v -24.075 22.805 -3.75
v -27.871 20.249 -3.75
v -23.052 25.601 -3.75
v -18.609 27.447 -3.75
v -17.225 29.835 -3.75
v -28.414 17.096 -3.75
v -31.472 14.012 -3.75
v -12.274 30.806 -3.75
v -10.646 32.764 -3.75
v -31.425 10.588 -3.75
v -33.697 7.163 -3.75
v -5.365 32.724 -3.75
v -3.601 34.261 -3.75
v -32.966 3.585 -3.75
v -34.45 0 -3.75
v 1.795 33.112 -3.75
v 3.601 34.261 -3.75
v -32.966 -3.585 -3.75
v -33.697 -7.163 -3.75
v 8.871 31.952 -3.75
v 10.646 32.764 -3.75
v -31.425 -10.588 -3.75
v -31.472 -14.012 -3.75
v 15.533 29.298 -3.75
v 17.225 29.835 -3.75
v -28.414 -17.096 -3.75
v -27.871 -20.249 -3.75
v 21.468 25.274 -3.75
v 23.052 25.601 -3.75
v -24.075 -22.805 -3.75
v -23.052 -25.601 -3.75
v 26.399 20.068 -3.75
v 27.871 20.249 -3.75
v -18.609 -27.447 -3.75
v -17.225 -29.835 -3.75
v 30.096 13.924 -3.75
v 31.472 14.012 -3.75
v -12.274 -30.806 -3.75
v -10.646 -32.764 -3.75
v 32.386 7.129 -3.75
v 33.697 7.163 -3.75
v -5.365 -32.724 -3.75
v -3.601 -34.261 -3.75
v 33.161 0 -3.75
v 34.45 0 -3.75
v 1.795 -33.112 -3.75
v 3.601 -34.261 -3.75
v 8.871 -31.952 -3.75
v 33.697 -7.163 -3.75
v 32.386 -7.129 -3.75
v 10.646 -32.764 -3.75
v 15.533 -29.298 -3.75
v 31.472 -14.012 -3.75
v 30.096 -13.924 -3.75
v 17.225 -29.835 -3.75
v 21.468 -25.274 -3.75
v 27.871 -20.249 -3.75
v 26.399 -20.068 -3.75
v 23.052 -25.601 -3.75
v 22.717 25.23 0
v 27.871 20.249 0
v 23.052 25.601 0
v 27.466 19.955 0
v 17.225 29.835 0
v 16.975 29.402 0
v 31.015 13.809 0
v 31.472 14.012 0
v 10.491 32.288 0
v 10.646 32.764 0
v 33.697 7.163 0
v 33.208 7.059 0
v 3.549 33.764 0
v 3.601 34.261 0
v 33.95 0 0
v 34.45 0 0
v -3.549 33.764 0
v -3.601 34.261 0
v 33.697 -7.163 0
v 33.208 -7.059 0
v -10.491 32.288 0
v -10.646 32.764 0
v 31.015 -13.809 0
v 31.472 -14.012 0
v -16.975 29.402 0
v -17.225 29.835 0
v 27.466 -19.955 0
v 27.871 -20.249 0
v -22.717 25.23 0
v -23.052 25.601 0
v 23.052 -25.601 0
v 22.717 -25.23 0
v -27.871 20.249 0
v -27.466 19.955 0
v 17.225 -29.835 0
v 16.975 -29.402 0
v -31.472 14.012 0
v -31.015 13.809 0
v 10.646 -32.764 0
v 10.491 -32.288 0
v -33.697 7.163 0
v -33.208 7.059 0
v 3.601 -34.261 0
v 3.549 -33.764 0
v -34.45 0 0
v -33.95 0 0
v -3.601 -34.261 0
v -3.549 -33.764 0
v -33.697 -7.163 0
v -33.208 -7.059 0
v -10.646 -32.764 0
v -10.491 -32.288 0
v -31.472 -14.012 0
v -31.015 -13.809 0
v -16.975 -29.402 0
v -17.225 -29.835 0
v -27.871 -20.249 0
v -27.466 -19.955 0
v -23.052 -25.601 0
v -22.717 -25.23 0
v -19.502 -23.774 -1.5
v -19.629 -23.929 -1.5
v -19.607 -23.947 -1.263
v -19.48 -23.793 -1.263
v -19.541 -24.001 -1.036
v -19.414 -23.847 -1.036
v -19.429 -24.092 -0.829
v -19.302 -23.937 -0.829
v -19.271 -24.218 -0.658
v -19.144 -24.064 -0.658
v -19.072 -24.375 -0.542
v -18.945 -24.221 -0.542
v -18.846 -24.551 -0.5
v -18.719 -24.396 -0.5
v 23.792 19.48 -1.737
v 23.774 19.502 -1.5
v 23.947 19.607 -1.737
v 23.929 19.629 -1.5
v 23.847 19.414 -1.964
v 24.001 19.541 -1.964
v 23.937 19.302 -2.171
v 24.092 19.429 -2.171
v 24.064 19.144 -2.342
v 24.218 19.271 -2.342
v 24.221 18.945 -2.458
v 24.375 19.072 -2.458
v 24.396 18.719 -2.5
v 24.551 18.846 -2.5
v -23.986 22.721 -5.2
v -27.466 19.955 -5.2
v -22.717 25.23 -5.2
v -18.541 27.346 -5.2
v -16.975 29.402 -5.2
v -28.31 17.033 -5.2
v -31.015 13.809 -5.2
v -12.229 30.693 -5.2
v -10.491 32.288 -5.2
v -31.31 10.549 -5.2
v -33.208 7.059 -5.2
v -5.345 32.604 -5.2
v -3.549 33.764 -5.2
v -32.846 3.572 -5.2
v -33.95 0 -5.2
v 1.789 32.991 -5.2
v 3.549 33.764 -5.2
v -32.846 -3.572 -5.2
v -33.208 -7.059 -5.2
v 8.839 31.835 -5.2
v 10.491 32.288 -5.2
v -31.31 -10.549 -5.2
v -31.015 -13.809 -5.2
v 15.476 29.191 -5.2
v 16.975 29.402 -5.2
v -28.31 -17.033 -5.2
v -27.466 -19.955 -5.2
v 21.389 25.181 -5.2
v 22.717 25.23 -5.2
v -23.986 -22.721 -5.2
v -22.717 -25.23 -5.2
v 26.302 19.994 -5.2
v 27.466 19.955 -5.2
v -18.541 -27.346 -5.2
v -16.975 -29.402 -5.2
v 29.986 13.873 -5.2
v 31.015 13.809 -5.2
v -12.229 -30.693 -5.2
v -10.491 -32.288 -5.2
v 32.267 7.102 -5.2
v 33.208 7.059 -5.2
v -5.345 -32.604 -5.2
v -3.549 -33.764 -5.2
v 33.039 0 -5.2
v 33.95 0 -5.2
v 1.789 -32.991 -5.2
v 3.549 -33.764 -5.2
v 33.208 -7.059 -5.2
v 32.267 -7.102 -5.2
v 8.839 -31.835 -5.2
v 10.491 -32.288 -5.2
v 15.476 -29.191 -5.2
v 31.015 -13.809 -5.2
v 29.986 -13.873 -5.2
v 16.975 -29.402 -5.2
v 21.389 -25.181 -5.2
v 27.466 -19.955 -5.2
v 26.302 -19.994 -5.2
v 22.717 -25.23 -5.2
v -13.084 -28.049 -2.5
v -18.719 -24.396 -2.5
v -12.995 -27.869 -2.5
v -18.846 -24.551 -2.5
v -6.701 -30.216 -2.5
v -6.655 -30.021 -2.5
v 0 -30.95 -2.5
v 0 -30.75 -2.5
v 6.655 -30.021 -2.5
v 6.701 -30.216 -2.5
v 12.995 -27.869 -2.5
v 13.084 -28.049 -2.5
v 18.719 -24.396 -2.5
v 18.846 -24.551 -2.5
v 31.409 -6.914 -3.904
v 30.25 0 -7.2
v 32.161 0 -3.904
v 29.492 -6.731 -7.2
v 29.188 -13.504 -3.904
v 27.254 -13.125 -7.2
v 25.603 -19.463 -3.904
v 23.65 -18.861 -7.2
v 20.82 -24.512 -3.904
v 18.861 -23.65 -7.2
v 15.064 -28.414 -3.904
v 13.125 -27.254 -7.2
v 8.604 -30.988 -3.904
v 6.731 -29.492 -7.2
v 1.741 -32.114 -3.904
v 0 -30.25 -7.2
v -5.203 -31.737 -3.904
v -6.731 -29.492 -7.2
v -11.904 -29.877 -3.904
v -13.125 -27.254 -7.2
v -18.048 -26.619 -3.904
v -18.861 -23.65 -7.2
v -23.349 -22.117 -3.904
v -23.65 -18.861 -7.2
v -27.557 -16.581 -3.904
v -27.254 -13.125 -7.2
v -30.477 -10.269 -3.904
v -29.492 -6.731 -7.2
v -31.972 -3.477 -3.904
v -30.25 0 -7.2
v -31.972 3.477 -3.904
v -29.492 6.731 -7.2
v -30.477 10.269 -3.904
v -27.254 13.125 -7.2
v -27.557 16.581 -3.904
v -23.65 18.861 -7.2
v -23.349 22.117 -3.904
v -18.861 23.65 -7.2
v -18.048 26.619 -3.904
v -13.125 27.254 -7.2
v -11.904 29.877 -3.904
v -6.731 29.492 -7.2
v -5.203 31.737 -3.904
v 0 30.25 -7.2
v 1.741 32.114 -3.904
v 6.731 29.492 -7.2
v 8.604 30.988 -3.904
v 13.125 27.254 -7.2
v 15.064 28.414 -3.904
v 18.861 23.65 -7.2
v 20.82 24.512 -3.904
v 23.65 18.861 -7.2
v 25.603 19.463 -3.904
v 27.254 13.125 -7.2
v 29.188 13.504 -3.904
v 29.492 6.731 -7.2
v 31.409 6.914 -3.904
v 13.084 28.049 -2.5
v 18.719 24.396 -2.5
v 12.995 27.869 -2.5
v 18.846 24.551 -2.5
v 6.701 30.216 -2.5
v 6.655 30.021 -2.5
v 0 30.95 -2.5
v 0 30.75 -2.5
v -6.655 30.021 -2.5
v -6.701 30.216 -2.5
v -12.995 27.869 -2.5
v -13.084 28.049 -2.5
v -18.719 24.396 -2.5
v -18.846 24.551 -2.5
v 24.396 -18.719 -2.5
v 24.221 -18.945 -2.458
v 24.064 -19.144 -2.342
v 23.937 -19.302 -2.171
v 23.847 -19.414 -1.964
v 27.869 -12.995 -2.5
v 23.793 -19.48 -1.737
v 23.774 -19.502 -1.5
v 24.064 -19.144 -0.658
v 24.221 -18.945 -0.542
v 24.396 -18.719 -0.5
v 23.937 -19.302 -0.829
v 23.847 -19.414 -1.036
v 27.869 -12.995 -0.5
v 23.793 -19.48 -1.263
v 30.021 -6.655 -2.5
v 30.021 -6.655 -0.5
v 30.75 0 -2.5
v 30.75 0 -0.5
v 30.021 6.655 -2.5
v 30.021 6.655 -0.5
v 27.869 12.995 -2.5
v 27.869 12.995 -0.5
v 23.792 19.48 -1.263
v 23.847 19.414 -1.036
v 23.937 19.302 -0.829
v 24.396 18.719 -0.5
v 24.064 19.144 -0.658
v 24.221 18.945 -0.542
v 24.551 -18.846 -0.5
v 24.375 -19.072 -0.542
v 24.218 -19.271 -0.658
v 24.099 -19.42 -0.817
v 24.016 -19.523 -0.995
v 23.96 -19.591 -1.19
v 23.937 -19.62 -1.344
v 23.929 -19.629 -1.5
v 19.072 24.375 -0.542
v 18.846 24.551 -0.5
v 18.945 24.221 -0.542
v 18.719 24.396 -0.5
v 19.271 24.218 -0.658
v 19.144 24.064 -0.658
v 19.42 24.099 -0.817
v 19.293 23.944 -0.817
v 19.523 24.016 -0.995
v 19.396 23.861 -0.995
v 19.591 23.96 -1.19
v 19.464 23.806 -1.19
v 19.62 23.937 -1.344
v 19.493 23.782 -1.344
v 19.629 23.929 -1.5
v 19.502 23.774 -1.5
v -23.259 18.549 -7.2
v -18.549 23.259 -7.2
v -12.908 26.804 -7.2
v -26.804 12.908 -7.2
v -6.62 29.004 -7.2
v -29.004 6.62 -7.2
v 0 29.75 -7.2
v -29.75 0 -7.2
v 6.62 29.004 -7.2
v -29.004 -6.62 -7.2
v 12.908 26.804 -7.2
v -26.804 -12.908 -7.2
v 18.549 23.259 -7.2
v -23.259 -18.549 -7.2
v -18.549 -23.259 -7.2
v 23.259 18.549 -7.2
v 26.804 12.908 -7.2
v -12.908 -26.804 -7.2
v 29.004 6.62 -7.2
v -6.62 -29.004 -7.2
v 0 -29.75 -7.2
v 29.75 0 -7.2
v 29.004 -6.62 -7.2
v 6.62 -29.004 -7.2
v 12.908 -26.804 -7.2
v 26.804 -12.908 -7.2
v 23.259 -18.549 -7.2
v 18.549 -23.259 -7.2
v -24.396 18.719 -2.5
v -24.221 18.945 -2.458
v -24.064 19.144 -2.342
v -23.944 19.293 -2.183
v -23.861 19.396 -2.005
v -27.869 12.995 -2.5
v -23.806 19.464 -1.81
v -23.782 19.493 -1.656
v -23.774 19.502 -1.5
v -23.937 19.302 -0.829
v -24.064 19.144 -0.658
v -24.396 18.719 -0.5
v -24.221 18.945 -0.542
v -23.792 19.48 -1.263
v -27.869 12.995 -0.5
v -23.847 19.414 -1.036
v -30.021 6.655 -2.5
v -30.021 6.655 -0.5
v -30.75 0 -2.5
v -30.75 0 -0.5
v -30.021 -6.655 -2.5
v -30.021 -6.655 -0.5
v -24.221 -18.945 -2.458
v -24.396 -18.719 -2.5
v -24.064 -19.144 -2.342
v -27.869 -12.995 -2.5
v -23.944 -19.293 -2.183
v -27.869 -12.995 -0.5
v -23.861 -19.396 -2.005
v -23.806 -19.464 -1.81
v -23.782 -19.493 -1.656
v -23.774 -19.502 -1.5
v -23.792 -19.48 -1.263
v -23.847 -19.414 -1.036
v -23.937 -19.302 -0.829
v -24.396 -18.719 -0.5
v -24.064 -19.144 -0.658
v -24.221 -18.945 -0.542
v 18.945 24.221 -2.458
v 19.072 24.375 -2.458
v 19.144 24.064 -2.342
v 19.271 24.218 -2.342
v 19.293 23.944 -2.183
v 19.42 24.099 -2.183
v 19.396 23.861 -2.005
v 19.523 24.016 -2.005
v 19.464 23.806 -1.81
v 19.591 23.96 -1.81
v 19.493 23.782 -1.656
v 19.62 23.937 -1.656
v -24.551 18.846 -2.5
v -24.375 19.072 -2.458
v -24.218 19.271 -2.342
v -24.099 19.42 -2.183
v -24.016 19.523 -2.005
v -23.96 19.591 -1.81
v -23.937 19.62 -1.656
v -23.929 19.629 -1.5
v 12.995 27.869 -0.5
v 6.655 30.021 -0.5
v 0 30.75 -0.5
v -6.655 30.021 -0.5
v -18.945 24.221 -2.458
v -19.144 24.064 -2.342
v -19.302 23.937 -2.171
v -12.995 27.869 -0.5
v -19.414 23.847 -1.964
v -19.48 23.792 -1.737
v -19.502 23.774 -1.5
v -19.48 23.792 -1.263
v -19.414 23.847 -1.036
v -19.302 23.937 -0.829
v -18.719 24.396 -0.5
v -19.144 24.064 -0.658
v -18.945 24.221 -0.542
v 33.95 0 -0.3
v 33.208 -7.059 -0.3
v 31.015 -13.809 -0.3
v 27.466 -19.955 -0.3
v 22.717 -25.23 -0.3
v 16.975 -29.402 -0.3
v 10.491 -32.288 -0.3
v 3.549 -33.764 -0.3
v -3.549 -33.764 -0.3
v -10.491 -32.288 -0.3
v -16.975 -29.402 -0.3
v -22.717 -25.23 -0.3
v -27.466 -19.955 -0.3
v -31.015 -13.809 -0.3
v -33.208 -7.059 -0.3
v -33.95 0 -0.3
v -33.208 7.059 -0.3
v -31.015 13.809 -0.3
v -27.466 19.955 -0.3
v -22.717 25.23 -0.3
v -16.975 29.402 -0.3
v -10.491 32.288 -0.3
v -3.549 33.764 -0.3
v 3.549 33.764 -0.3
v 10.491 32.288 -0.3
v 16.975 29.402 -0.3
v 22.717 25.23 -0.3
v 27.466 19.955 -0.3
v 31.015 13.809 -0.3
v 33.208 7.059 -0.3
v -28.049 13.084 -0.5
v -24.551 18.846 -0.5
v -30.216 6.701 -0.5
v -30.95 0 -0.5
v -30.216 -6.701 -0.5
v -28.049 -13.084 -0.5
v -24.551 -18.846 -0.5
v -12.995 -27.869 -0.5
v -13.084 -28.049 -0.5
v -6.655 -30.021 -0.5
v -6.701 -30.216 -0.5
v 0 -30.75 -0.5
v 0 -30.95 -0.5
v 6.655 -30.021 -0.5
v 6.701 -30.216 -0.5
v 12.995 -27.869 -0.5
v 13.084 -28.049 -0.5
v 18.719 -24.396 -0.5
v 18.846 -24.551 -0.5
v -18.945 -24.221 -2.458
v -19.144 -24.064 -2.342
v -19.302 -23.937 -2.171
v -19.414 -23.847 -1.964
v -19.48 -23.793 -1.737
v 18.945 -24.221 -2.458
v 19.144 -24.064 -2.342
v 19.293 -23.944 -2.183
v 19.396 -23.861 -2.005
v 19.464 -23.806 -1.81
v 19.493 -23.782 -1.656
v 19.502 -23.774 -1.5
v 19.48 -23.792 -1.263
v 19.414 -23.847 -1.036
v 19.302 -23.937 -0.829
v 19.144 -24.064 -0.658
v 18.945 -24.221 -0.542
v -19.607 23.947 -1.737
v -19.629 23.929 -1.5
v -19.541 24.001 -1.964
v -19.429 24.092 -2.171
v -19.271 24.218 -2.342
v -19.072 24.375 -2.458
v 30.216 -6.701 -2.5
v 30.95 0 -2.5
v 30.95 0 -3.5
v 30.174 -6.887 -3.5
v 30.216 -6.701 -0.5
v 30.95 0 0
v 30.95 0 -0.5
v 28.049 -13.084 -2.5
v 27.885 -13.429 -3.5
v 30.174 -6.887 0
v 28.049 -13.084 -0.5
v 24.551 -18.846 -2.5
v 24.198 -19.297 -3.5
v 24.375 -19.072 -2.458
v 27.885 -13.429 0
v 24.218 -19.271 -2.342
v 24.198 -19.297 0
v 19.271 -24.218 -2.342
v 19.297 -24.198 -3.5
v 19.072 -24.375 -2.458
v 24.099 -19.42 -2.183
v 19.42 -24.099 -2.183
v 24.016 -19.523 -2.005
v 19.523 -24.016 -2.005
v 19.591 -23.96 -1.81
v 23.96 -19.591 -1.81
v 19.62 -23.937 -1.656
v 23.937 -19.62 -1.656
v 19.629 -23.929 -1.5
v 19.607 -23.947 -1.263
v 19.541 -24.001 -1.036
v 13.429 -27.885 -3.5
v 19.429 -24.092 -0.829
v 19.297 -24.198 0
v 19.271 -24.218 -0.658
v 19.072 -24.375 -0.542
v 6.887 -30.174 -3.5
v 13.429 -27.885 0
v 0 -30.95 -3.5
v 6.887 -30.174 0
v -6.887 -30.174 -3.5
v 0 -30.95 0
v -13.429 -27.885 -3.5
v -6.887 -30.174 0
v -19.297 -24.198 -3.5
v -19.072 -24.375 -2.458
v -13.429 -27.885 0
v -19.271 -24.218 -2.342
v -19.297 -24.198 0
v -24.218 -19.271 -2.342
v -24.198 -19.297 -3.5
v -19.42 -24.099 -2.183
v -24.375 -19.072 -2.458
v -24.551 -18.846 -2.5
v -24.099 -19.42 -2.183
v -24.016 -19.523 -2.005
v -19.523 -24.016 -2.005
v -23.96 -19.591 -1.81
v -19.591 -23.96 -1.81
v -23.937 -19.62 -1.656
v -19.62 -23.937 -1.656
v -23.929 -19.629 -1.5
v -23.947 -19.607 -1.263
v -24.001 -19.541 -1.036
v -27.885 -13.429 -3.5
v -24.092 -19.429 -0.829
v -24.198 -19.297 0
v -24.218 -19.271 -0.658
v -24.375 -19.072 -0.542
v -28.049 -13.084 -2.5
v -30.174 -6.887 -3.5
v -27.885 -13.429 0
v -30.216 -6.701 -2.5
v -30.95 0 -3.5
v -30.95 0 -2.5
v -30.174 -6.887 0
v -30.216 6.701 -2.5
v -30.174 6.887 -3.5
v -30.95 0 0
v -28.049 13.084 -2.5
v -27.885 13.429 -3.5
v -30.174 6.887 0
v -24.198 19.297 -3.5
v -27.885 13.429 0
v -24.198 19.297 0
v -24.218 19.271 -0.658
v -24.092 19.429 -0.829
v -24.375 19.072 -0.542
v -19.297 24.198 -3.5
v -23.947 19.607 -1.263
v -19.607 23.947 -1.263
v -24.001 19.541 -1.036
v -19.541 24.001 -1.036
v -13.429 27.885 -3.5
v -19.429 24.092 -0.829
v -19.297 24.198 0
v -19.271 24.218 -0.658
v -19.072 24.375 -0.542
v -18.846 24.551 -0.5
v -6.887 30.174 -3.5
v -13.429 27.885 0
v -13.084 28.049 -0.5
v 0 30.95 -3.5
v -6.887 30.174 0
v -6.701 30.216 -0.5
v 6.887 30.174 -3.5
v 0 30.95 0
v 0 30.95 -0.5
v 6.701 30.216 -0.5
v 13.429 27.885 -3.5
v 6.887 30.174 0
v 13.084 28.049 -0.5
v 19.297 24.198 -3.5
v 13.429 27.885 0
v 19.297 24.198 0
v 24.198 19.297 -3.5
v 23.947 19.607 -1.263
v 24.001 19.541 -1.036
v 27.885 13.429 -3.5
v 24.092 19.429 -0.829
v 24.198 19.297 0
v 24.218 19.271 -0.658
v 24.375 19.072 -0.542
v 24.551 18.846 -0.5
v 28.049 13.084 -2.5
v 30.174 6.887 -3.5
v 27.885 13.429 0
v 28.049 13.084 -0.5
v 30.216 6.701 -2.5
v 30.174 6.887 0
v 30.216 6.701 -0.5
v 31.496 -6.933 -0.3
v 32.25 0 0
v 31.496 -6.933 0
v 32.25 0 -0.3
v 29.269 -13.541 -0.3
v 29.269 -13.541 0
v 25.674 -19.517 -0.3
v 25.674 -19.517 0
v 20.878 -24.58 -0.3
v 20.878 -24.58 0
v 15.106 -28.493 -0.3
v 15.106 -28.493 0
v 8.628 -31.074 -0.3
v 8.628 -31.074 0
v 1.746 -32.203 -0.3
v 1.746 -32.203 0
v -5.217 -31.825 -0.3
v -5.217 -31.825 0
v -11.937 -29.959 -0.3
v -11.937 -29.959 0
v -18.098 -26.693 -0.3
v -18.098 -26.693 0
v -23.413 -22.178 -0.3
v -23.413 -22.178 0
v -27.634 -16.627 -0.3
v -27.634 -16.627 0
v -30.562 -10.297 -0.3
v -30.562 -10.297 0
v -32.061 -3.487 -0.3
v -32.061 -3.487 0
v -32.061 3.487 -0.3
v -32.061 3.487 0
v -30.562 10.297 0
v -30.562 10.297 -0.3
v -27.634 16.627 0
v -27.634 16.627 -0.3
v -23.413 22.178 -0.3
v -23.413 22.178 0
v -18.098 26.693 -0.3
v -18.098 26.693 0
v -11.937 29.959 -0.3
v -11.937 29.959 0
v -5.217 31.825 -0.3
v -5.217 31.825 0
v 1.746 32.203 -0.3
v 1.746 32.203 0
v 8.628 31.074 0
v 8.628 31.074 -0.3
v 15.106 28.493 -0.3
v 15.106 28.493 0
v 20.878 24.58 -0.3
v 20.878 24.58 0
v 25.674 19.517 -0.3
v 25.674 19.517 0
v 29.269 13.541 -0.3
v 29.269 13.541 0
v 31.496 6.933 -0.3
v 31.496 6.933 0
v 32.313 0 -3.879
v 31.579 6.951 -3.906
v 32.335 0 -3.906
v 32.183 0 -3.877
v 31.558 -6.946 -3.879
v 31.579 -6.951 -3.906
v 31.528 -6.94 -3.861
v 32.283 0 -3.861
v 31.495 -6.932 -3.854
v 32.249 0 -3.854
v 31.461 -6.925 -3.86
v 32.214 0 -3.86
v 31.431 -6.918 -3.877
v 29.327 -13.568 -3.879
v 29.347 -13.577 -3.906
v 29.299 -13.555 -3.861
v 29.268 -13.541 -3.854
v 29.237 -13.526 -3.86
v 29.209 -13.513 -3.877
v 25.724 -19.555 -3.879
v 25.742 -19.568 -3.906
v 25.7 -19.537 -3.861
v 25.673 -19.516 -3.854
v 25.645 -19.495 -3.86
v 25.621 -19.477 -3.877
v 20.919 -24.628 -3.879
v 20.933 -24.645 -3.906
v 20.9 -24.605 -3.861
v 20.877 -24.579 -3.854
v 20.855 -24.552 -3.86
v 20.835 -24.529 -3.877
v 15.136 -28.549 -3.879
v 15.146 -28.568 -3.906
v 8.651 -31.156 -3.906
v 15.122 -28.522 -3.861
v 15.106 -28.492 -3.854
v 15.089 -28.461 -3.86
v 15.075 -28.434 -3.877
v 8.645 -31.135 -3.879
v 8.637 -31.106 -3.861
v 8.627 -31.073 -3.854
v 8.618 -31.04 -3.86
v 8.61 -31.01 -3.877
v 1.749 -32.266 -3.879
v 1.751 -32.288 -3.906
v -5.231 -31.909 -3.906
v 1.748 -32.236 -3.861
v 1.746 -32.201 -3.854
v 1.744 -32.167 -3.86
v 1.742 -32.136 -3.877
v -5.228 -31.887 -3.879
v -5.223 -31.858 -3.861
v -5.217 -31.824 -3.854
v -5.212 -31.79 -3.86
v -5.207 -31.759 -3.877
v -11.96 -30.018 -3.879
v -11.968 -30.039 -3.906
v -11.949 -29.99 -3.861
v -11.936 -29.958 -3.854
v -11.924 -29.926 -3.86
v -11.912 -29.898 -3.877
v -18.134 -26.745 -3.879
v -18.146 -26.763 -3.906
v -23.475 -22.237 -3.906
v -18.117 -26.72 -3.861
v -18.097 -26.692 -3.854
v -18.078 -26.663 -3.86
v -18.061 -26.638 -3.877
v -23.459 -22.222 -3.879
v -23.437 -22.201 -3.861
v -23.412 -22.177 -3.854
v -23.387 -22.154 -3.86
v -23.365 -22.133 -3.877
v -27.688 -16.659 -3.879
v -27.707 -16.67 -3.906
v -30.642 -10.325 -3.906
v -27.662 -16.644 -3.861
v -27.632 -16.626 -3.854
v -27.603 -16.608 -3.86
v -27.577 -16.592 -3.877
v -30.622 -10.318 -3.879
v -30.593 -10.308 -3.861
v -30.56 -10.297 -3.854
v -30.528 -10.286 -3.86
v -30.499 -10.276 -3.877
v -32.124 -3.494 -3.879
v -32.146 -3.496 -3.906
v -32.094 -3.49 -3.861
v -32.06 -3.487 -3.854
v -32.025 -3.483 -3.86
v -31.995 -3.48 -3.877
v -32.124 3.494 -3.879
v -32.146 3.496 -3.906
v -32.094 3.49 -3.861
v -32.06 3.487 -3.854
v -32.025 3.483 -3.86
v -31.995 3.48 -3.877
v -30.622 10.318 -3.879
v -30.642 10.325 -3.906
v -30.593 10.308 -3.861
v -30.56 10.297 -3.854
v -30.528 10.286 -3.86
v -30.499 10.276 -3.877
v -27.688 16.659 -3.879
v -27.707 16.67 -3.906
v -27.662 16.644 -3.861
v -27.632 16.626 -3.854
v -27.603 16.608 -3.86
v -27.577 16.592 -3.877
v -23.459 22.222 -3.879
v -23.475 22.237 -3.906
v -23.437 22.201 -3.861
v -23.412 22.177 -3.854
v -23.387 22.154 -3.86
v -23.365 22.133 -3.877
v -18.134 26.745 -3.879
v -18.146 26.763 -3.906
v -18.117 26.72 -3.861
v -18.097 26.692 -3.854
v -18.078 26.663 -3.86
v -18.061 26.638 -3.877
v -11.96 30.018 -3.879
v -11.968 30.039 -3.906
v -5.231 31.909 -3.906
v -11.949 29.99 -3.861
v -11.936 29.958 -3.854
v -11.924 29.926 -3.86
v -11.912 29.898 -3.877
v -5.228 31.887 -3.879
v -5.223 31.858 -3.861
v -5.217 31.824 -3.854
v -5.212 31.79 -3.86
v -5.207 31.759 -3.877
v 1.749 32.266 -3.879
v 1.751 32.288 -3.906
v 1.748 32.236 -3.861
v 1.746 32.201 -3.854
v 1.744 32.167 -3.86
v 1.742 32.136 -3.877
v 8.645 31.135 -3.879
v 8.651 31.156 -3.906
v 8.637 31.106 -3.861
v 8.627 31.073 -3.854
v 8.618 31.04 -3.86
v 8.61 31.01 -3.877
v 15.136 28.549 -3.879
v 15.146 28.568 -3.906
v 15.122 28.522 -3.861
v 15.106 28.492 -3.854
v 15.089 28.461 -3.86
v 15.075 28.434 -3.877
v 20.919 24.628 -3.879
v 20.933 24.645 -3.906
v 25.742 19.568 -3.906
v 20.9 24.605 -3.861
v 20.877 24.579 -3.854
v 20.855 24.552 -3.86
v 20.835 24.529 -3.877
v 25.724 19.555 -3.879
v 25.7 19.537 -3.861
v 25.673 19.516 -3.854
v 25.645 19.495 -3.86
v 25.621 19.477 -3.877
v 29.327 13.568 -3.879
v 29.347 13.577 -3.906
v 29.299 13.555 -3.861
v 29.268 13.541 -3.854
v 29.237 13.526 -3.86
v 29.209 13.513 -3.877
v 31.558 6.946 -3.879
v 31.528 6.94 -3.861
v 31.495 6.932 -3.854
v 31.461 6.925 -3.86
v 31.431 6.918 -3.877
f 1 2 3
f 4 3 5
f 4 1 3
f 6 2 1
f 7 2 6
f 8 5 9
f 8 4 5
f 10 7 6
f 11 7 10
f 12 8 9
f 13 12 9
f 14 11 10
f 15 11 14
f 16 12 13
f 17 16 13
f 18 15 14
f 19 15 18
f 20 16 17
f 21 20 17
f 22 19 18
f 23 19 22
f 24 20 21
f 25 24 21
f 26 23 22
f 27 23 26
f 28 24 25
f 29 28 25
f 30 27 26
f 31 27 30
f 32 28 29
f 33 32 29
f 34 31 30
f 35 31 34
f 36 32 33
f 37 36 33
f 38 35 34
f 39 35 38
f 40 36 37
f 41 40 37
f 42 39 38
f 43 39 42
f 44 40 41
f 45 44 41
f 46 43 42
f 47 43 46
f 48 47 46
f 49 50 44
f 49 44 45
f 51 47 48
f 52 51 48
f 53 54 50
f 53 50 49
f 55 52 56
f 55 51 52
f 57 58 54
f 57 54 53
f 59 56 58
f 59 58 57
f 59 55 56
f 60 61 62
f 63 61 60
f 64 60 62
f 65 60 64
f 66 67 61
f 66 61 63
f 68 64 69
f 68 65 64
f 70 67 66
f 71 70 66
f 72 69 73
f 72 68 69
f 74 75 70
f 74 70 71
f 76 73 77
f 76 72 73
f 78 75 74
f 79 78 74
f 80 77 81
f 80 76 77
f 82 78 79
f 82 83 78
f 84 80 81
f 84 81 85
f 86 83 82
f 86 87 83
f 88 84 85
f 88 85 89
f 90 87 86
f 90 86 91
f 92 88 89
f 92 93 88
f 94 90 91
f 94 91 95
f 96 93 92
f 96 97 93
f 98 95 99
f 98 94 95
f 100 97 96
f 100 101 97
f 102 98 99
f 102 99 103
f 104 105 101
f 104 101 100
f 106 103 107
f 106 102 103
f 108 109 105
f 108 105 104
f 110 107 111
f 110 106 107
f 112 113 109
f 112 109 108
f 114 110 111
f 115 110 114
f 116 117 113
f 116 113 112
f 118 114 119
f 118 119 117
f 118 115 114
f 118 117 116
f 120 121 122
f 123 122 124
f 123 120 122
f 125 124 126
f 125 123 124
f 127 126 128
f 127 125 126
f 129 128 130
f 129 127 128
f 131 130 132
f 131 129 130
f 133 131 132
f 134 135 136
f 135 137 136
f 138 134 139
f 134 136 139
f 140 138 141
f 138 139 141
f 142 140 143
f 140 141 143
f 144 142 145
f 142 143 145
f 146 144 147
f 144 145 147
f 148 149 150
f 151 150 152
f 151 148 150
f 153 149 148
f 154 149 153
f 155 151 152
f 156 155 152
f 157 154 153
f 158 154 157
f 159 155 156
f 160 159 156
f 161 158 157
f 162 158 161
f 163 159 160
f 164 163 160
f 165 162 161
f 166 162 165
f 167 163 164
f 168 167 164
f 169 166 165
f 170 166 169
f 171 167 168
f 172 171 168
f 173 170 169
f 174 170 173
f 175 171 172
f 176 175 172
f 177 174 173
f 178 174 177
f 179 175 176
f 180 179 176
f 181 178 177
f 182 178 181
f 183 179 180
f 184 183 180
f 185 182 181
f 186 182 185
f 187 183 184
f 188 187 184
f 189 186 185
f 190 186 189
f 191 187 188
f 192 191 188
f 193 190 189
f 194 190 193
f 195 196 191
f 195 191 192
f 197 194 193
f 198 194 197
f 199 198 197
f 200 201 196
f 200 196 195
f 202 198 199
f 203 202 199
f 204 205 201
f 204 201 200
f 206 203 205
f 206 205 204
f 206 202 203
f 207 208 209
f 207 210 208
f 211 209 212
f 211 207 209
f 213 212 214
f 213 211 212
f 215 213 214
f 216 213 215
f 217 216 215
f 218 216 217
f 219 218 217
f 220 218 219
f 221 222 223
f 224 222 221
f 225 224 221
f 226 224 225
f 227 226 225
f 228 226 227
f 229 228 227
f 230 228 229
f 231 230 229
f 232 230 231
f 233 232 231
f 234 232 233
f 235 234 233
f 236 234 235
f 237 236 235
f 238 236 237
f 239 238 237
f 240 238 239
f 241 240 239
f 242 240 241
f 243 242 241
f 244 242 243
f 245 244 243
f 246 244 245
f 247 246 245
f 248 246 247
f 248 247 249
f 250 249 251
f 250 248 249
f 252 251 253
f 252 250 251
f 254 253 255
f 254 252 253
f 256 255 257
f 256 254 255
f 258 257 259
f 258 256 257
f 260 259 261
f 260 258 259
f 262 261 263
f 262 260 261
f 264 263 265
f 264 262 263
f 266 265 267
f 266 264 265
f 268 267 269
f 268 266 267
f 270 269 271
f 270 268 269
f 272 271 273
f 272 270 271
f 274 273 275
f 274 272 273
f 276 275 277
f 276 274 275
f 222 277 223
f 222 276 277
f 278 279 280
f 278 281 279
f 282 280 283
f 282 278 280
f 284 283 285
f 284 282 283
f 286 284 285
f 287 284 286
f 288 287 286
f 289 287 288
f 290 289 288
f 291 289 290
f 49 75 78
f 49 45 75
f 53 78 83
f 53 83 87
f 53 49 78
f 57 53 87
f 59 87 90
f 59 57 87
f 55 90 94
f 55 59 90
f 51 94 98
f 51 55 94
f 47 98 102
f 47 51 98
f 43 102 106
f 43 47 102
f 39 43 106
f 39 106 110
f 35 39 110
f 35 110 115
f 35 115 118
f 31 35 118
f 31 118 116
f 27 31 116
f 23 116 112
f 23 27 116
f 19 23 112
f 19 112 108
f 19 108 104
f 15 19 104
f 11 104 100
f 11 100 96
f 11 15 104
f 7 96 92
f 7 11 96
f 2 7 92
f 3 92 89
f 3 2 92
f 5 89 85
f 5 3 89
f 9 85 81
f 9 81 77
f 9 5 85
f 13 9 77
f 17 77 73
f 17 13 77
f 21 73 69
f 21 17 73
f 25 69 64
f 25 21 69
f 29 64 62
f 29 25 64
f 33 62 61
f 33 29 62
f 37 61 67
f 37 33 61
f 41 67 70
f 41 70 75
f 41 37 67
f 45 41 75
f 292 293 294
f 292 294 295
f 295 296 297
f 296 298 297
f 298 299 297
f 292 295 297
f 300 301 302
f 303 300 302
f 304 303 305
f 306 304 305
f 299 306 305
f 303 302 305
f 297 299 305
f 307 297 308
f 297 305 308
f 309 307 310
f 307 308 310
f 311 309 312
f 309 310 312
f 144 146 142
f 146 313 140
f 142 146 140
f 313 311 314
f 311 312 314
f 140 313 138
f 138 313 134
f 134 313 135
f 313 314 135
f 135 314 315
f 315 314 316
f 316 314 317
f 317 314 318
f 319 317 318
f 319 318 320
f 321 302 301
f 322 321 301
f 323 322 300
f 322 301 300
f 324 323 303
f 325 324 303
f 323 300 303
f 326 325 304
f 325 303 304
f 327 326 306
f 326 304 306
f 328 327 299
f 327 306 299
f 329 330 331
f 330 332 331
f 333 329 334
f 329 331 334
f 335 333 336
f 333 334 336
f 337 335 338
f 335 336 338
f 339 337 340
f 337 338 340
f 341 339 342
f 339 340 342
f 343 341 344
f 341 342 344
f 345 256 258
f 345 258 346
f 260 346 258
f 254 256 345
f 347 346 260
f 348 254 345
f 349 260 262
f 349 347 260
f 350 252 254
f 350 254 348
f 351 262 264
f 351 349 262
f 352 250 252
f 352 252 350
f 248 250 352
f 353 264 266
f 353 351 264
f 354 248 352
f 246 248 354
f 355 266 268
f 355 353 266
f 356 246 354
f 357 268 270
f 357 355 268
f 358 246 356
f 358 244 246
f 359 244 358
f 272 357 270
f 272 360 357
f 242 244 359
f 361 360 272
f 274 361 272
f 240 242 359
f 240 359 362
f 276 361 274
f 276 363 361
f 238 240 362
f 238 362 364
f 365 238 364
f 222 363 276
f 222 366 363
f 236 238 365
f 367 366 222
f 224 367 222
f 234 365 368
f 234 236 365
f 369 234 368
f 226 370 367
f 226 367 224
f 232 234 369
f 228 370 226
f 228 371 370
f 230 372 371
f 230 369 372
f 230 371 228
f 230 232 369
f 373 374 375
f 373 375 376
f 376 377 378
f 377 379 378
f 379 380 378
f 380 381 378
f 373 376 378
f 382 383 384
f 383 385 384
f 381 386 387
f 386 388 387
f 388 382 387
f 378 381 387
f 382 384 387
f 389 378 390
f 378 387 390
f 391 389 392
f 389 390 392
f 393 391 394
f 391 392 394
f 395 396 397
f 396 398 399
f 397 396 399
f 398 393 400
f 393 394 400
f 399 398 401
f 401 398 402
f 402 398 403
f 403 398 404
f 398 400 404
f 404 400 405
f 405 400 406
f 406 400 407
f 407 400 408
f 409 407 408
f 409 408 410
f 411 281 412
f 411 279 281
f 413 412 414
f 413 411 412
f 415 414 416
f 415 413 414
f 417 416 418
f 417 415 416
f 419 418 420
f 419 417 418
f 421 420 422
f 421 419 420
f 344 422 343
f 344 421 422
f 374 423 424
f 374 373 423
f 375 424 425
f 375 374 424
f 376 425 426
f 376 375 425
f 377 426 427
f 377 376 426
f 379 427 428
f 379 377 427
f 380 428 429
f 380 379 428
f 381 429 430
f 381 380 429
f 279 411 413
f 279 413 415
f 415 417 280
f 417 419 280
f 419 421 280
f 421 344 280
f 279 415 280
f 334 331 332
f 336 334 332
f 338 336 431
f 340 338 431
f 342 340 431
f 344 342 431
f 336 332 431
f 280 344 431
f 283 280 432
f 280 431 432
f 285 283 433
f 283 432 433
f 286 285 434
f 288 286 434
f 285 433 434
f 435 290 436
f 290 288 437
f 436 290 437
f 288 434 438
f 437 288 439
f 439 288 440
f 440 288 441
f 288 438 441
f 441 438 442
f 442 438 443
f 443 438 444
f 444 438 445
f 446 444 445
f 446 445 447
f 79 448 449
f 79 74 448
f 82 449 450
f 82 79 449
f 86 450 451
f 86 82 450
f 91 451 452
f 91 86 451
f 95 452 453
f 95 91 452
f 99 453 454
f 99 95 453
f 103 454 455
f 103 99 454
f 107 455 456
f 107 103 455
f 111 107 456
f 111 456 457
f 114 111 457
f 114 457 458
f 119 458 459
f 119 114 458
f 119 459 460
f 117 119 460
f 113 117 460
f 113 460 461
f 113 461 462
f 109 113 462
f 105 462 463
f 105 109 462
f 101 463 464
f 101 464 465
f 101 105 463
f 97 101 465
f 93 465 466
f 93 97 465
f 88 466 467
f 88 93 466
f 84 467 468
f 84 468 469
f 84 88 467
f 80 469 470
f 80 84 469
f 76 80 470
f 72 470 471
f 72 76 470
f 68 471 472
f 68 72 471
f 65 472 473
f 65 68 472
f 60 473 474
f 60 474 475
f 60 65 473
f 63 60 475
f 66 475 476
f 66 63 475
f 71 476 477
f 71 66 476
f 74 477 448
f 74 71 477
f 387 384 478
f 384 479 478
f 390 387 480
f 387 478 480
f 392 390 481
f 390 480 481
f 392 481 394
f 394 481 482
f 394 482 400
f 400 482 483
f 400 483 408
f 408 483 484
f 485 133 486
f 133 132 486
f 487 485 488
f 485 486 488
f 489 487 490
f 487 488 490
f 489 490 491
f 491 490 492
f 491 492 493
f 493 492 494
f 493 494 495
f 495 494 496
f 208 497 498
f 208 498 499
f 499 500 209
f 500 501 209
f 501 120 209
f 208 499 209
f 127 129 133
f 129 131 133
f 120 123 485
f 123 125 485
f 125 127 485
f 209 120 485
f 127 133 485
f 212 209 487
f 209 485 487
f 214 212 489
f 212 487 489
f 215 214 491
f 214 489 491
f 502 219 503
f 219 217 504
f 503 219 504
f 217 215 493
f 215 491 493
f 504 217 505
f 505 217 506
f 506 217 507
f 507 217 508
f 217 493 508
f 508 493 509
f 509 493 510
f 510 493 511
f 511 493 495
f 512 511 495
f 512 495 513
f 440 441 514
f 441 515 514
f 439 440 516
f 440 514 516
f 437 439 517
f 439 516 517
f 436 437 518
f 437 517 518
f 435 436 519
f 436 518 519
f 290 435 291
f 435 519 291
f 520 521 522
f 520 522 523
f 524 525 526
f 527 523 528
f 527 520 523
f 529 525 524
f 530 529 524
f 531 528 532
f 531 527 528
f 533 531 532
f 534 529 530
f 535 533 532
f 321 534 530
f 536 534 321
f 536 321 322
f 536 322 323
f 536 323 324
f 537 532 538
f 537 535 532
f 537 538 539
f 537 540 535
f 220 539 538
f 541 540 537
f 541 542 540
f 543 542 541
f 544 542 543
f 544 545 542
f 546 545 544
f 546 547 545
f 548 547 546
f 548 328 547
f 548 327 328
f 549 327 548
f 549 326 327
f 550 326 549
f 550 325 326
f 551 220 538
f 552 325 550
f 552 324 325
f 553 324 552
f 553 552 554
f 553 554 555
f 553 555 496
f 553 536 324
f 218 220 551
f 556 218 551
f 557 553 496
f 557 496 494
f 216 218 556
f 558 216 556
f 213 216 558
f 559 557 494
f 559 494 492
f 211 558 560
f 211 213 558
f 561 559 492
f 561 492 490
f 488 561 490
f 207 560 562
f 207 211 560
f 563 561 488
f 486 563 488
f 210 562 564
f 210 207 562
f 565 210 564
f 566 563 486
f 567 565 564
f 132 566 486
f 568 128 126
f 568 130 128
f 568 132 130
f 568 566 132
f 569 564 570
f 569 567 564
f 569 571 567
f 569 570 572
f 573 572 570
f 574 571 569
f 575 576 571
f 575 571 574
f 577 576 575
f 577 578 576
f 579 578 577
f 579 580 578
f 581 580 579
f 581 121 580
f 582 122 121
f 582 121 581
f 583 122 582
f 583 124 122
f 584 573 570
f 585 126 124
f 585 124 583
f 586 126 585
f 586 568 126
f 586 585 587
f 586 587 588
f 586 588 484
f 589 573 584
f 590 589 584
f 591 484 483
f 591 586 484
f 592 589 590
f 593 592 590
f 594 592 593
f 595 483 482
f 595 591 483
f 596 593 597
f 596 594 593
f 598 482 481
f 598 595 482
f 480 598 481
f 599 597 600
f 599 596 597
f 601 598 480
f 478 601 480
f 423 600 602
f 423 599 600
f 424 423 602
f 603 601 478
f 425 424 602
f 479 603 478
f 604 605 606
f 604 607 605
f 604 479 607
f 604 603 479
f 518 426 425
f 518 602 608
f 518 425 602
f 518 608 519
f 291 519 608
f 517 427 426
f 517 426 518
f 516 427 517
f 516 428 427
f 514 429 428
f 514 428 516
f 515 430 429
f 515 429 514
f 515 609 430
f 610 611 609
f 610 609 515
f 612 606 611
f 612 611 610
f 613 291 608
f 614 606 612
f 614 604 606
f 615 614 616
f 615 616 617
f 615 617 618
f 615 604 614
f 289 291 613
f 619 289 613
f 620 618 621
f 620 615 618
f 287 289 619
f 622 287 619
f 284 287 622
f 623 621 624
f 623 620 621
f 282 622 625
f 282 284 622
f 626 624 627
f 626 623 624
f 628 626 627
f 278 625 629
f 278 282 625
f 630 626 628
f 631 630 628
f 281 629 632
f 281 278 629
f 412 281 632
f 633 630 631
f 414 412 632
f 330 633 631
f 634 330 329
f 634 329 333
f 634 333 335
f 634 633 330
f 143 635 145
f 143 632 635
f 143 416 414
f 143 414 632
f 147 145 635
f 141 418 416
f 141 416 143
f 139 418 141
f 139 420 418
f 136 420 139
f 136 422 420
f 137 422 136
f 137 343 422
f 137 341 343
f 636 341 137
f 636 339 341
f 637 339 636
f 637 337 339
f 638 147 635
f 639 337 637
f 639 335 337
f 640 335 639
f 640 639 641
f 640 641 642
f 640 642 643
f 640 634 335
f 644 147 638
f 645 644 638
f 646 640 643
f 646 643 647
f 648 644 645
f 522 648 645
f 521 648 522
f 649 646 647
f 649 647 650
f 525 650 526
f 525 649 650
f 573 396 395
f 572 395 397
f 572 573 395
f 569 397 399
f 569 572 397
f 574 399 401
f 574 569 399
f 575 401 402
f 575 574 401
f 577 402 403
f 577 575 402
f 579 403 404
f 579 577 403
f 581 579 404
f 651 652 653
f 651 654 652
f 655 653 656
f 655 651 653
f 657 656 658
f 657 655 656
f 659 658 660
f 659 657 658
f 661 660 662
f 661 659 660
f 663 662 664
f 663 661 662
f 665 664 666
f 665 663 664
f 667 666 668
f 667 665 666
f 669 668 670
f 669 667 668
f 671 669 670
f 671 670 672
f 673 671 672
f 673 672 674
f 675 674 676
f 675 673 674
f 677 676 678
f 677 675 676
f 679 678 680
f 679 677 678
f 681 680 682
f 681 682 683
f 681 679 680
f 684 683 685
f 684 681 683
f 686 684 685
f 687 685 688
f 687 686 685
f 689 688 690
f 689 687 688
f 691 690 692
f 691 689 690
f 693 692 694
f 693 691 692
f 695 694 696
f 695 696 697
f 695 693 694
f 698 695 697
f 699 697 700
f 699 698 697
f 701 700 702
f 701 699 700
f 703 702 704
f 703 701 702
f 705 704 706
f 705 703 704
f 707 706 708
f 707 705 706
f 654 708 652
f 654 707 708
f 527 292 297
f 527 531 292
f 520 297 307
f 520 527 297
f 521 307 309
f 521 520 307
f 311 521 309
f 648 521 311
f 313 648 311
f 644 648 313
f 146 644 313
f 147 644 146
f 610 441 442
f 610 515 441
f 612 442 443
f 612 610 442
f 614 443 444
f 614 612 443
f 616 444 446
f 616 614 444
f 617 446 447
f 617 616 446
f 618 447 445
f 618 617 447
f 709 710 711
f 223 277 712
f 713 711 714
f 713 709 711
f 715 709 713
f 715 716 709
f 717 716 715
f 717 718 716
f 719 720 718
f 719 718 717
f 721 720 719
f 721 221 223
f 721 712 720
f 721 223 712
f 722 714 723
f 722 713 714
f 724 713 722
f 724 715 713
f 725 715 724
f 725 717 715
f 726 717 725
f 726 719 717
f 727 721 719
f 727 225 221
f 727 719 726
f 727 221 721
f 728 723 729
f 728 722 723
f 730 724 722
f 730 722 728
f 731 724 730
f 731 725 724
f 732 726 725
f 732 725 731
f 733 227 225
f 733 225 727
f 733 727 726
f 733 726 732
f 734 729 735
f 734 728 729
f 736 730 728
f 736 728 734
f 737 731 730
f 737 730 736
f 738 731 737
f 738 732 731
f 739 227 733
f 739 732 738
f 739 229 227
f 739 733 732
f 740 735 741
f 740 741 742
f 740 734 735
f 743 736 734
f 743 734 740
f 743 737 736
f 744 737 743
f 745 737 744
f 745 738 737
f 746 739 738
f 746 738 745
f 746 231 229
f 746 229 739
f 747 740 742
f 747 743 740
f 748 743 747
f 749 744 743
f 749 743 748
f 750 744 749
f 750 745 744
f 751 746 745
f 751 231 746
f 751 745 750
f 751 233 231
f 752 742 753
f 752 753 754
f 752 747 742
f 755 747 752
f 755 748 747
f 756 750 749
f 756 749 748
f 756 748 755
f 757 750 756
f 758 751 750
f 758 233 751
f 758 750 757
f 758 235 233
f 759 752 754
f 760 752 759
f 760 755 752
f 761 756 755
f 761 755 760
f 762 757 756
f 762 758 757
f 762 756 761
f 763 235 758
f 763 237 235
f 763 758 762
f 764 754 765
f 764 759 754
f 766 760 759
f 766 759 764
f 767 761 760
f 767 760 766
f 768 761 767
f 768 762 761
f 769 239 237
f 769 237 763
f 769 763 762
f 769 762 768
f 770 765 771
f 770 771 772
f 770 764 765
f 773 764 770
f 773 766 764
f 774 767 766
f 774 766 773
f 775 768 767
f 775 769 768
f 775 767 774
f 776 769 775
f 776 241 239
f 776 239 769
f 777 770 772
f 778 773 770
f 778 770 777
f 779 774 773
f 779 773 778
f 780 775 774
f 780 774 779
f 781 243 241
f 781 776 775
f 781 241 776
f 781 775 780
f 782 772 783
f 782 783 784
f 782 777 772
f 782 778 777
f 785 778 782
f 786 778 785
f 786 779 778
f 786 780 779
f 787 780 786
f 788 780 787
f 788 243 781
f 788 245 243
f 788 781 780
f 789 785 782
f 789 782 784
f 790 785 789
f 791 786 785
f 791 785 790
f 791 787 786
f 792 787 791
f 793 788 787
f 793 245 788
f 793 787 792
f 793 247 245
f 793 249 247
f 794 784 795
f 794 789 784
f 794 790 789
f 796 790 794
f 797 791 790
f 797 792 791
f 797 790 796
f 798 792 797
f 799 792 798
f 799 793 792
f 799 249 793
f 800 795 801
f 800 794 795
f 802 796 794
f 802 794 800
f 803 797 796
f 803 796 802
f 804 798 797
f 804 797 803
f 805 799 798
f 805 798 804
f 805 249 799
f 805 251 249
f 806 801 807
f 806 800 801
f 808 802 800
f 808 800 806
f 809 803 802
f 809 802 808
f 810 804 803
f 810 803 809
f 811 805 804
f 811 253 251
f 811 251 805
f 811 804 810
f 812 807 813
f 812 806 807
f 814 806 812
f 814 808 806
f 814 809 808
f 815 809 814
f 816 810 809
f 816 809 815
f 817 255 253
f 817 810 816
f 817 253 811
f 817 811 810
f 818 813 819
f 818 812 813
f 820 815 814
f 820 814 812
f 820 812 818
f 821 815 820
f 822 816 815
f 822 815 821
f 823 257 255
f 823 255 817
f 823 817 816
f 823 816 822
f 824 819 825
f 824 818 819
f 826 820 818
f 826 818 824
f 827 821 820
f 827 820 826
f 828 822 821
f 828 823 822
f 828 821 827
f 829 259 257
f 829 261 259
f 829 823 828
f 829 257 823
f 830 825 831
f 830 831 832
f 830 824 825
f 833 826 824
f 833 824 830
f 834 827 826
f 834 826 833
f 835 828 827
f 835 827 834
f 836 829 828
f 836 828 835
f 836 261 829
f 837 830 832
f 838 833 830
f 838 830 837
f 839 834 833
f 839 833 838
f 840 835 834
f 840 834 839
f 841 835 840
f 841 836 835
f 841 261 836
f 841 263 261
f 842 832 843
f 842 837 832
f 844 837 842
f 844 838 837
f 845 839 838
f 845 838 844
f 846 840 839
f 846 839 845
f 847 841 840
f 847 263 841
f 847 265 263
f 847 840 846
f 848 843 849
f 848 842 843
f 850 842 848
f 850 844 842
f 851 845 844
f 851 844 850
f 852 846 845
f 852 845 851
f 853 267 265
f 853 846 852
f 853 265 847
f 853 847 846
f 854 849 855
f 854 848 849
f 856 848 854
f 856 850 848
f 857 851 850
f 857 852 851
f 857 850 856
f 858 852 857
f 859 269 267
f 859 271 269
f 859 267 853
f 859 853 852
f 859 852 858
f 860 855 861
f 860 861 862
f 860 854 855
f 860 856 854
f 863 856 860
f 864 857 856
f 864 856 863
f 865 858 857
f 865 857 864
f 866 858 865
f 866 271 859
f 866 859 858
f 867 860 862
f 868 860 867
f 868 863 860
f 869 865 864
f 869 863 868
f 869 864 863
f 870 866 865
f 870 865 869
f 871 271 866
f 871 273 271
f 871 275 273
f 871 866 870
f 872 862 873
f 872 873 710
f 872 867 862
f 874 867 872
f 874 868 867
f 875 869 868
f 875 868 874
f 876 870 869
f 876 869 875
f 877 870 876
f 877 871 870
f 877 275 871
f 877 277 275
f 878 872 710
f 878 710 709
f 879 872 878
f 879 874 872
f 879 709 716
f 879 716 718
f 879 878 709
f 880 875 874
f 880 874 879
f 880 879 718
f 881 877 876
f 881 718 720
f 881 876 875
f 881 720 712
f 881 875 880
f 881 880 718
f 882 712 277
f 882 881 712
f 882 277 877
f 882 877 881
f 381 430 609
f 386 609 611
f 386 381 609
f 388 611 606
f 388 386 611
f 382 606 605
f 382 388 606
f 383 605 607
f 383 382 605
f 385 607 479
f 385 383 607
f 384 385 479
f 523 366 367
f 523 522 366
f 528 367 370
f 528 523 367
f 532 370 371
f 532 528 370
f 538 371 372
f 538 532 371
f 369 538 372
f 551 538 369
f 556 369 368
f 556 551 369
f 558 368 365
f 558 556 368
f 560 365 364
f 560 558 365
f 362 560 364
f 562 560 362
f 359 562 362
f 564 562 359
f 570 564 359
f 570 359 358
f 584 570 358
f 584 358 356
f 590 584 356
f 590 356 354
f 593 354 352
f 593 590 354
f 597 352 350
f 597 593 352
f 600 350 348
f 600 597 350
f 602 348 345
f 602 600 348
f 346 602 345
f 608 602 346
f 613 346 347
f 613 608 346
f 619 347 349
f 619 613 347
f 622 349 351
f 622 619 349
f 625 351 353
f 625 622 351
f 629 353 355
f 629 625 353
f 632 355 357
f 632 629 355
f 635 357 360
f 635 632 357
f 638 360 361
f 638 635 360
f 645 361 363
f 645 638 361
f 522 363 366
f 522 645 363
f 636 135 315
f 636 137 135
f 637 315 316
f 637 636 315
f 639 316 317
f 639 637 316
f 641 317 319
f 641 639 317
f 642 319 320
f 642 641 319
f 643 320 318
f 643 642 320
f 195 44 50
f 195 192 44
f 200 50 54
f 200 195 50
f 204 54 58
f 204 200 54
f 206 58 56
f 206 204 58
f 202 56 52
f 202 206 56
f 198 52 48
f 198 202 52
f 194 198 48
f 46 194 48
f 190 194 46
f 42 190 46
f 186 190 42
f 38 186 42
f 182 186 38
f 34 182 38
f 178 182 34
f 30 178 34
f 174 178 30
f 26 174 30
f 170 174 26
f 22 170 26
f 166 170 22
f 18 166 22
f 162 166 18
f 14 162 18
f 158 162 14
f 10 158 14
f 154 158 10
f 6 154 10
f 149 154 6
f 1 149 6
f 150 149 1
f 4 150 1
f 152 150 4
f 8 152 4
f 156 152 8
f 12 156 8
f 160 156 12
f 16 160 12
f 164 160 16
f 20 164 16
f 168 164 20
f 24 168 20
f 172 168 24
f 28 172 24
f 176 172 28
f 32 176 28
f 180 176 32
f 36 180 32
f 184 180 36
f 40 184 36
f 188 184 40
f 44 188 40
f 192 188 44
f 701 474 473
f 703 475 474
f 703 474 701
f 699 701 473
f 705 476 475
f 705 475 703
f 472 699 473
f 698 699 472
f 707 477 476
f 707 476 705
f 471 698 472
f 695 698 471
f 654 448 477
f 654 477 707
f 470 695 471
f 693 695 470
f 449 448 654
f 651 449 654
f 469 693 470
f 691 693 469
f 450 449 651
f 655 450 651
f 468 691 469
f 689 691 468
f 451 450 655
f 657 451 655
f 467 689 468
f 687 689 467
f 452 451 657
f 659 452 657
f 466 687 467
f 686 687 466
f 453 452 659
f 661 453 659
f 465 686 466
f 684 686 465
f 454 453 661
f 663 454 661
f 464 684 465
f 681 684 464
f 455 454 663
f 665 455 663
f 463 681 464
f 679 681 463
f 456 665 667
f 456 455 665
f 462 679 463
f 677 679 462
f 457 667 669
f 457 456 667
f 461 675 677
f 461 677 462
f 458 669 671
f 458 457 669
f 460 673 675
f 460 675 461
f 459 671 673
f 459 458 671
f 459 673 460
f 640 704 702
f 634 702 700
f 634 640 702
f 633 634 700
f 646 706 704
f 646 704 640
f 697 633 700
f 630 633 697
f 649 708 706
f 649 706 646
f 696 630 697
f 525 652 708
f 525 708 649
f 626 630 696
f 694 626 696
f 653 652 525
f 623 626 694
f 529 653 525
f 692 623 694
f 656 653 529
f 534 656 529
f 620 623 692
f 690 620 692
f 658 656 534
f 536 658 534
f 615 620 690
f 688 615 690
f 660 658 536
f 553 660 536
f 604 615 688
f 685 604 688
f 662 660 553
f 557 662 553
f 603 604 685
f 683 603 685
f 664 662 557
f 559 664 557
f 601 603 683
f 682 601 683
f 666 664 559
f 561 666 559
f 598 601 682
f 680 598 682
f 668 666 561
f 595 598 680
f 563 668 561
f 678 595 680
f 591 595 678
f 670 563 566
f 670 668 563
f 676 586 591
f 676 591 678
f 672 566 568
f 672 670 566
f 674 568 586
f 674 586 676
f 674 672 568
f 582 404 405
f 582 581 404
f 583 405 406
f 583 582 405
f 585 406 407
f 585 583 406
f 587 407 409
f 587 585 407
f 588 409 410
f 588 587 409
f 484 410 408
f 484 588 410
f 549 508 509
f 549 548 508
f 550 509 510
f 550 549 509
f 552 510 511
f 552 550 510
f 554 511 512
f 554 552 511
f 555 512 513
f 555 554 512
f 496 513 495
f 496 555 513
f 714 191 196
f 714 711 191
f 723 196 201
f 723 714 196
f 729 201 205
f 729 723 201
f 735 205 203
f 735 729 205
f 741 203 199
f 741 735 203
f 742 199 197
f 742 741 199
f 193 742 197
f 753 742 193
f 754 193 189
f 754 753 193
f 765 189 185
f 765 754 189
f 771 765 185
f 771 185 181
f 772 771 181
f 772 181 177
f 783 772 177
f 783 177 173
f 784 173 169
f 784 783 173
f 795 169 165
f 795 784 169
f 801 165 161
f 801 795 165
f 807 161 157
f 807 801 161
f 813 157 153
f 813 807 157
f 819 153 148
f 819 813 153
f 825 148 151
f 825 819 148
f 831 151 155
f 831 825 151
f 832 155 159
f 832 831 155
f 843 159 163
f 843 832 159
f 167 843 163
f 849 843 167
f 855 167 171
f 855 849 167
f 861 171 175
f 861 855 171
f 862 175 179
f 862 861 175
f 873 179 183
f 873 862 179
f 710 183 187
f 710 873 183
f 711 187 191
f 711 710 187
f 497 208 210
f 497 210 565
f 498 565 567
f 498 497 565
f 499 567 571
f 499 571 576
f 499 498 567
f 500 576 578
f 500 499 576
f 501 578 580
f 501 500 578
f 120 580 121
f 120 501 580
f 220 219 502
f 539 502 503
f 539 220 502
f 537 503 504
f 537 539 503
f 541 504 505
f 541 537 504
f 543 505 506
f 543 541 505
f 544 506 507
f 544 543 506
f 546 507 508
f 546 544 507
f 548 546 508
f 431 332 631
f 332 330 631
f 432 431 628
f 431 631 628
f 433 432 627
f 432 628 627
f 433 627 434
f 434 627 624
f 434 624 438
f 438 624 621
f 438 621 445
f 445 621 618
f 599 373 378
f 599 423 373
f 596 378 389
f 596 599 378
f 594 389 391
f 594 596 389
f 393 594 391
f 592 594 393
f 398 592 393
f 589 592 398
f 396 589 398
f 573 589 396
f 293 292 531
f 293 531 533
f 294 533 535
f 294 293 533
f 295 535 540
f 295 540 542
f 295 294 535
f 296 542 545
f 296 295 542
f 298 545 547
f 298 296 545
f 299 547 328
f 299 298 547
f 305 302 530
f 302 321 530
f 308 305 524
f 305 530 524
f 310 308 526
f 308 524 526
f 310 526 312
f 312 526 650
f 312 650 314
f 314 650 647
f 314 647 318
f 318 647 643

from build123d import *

# Parameters (mm, degrees)
BOSS_EXTRUDE1_DEPTH      = 2
FILLET1_R                = 1
CIRPATTERN1_COUNT        = 4
FILLET1_OF_CIRPATTERN1_R = 1


with BuildPart() as part:
    # Sketch1 → Revolve1 (revolve)
    with BuildSketch(Plane(origin=(0, 0, 0), x_dir=(0, 0, -1), z_dir=(1, 0, 0)), mode=Mode.PRIVATE) as revolve1_sk:
        with BuildLine():
            Line((3.75, 34.45), (3.75, 33.95))
            Line((3.75, 33.95), (3.75, 33.160815003))
            Line((3.75, 33.160815003), (5.2, 33.95))
            Line((5.2, 33.95), (5.2, 33.039184997))
            Line((5.2, 33.039184997), (3.906327923, 32.335083898))
            ThreePointArc((3.906327923, 32.335083898), (3.854141696, 32.248597283), (3.903979583, 32.160736474))
            Line((3.903979583, 32.160736474), (7.2, 30.25))
            Line((7.2, 30.25), (7.2, 29.75))
            Line((7.2, 29.75), (3.5, 30.95))
            Line((3.5, 30.95), (0, 30.95))
            Line((0, 30.95), (0, 32.25))
            Line((0, 32.25), (0.3, 32.25))
            Line((0.3, 32.25), (0.3, 33.95))
            Line((0.3, 33.95), (0, 33.95))
            Line((0, 33.95), (0, 34.45))
            Line((0, 34.45), (3.75, 34.45))
        make_face()
    revolve(revolve1_sk.sketch.rotate(Axis((0, 0, 0), (0, 0, -1)), 90), axis=Axis((0, 0, 0), (0, 0, -1)))

    # Sketch2 → Boss-Extrude1 (add)
    with BuildSketch(Plane.XY.offset(-0.5)):
        with BuildLine():
            Line((-19.502212389, 23.774486575), (-21.5, 26.209921785))
            ThreePointArc((-21.5, 26.209921785), (0, 33.9), (21.5, 26.209921785))
            Line((21.5, 26.209921785), (19.502212389, 23.774486575))
            ThreePointArc((19.502212389, 23.774486575), (0, 30.75), (-19.502212389, 23.774486575))
        make_face()
    boss_extrude1 = extrude(amount=-BOSS_EXTRUDE1_DEPTH)

    # Fillet1
    fillet1_edges = [part.edges().sort_by_distance(p)[0] for p in [
        (-19.565634218, 23.851801979, -2.5),
        (-19.565634218, 23.851801979, -0.5),
        (19.565634218, 23.851801979, -2.5),
        (19.565634218, 23.851801979, -0.5),
    ]]
    fillet(fillet1_edges, radius=FILLET1_R - 0.0001)  # a hair under: the kernel refuses the full size

    # CirPattern1: Boss-Extrude1 ×4 about axis
    cirpattern1_axis = Axis((0, 0, 0), (0, 0, 1))
    for i in range(1, CIRPATTERN1_COUNT):
        add(boss_extrude1.rotate(cirpattern1_axis, i * 360 / CIRPATTERN1_COUNT))

    # Fillet1 of CirPattern1
    fillet1_of_cirpattern1_edges = [part.edges().sort_by_distance(p)[0] for p in [
        (-23.851801979, -19.565634218, -2.5),
        (-23.851801979, -19.565634218, -0.5),
        (-23.851801979, 19.565634218, -2.5),
        (-23.851801979, 19.565634218, -0.5),
        (19.565634218, -23.851801979, -2.5),
        (19.565634218, -23.851801979, -0.5),
        (-19.565634218, -23.851801979, -2.5),
        (-19.565634218, -23.851801979, -0.5),
        (23.851801979, 19.565634218, -2.5),
        (23.851801979, 19.565634218, -0.5),
        (23.851801979, -19.565634218, -2.5),
        (23.851801979, -19.565634218, -0.5),
    ]]
    fillet(fillet1_of_cirpattern1_edges, radius=FILLET1_OF_CIRPATTERN1_R - 0.0001)  # a hair under: the kernel refuses the full size


solid = part.part
